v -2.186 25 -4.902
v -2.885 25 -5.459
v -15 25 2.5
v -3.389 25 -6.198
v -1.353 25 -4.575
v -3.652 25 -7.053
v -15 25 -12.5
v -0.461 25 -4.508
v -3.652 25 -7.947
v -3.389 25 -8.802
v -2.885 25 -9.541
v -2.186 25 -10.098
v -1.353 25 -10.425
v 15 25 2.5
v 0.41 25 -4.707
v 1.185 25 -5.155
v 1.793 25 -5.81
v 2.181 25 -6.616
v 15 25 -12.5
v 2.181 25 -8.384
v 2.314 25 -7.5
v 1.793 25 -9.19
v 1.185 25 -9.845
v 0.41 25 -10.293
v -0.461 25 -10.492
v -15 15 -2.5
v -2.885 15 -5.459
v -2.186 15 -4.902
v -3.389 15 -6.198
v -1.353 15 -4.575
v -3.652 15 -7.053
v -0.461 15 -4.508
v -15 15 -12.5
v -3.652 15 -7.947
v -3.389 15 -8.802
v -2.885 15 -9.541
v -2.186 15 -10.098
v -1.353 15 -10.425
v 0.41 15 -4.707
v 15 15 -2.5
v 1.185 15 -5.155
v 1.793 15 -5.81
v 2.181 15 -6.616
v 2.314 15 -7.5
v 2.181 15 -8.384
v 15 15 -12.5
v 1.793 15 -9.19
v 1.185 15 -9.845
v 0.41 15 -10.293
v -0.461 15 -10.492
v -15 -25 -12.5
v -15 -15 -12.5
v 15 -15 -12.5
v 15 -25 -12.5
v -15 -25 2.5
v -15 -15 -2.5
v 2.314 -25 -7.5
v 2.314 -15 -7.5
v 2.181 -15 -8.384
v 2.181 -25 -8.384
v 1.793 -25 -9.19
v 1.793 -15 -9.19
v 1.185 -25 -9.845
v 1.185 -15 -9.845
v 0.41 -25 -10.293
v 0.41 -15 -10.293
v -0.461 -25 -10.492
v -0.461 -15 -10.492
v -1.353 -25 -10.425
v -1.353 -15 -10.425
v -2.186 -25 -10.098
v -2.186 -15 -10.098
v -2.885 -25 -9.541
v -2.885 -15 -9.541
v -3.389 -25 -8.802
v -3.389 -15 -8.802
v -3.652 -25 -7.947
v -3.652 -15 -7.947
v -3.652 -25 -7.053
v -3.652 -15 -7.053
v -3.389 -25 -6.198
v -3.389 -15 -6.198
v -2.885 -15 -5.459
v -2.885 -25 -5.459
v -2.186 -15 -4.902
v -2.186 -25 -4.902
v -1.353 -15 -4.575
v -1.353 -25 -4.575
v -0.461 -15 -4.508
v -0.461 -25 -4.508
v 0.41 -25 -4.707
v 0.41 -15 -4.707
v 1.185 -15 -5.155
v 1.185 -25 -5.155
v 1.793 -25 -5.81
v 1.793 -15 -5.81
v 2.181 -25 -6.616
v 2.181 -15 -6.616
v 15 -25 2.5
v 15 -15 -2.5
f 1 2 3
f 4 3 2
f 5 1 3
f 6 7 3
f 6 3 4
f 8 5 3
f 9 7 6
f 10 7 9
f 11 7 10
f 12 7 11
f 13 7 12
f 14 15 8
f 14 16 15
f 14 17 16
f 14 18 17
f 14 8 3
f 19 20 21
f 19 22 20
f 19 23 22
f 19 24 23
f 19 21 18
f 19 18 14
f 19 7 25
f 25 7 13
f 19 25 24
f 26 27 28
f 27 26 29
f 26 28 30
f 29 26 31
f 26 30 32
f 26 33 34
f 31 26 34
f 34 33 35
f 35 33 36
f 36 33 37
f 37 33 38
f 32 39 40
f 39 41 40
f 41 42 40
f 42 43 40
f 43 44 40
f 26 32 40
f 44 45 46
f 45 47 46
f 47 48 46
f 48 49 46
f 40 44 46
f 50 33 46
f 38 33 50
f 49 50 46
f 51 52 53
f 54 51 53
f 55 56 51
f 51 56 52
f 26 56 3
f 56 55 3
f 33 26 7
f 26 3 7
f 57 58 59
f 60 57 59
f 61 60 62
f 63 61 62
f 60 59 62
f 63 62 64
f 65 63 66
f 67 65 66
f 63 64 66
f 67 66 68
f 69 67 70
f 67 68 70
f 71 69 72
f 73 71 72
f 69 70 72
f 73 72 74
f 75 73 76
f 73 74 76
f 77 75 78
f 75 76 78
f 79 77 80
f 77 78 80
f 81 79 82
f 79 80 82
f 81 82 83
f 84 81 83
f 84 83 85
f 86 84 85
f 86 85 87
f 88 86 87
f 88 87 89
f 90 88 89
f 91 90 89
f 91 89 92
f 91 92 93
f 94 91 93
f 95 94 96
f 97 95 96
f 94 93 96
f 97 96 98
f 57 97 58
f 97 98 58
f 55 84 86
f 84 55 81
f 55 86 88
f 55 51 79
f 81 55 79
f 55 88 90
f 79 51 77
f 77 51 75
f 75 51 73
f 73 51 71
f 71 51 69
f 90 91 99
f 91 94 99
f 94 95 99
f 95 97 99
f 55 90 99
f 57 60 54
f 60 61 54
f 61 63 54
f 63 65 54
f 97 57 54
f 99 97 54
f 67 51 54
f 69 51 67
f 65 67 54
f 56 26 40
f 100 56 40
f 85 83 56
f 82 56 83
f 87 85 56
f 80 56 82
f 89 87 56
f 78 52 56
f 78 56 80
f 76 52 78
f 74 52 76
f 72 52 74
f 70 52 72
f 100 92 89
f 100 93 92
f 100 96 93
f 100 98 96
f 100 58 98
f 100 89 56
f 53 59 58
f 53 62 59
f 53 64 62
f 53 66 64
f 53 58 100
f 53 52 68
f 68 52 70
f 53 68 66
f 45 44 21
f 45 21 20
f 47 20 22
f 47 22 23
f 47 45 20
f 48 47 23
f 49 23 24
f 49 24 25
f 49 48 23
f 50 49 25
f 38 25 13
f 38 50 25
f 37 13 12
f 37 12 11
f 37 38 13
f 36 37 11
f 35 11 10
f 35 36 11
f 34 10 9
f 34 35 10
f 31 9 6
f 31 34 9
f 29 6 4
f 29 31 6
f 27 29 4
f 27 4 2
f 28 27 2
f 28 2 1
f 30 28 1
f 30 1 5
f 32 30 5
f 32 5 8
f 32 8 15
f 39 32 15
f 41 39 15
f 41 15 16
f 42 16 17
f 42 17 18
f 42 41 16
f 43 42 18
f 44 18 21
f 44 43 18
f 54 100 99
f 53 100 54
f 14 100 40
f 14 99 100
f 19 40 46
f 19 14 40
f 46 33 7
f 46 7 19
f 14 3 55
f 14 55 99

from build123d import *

# Parameters (mm, degrees)
BOSS_EXTRUDE2_DEPTH      = 2.5
BOSS_EXTRUDE2_DEPTH_BACK = 2.5
SKETCH4_W                = 30
SKETCH4_H                = 30
SKETCH5_W                = 30
SKETCH5_H                = 15
SKETCH5_R                = 3
BOSS_EXTRUDE3_DEPTH      = 10


with BuildPart() as part:
    # Sketch4 → Boss-Extrude2 (new, two sides: drawn at the far end of the back side and taken through both)
    with BuildSketch(Plane.XY.offset(-BOSS_EXTRUDE2_DEPTH_BACK)):
        Rectangle(SKETCH4_W, SKETCH4_H)
    extrude(amount=BOSS_EXTRUDE2_DEPTH + BOSS_EXTRUDE2_DEPTH_BACK)

    # Sketch5 → Boss-Extrude3 (add)
    with BuildSketch(Plane(origin=(0, 15, 0), x_dir=(1, 0, 0), z_dir=(0, 1, 0))):
        with Locations((0, 5)):
            Rectangle(SKETCH5_W, SKETCH5_H)
        with Locations((-0.685637394, 7.5)):
            Circle(SKETCH5_R, mode=Mode.SUBTRACT)
    boss_extrude3 = extrude(amount=BOSS_EXTRUDE3_DEPTH)

    # Mirror1: Boss-Extrude3 across plane
    add(boss_extrude3.mirror(Plane.ZX))


solid = part.part
